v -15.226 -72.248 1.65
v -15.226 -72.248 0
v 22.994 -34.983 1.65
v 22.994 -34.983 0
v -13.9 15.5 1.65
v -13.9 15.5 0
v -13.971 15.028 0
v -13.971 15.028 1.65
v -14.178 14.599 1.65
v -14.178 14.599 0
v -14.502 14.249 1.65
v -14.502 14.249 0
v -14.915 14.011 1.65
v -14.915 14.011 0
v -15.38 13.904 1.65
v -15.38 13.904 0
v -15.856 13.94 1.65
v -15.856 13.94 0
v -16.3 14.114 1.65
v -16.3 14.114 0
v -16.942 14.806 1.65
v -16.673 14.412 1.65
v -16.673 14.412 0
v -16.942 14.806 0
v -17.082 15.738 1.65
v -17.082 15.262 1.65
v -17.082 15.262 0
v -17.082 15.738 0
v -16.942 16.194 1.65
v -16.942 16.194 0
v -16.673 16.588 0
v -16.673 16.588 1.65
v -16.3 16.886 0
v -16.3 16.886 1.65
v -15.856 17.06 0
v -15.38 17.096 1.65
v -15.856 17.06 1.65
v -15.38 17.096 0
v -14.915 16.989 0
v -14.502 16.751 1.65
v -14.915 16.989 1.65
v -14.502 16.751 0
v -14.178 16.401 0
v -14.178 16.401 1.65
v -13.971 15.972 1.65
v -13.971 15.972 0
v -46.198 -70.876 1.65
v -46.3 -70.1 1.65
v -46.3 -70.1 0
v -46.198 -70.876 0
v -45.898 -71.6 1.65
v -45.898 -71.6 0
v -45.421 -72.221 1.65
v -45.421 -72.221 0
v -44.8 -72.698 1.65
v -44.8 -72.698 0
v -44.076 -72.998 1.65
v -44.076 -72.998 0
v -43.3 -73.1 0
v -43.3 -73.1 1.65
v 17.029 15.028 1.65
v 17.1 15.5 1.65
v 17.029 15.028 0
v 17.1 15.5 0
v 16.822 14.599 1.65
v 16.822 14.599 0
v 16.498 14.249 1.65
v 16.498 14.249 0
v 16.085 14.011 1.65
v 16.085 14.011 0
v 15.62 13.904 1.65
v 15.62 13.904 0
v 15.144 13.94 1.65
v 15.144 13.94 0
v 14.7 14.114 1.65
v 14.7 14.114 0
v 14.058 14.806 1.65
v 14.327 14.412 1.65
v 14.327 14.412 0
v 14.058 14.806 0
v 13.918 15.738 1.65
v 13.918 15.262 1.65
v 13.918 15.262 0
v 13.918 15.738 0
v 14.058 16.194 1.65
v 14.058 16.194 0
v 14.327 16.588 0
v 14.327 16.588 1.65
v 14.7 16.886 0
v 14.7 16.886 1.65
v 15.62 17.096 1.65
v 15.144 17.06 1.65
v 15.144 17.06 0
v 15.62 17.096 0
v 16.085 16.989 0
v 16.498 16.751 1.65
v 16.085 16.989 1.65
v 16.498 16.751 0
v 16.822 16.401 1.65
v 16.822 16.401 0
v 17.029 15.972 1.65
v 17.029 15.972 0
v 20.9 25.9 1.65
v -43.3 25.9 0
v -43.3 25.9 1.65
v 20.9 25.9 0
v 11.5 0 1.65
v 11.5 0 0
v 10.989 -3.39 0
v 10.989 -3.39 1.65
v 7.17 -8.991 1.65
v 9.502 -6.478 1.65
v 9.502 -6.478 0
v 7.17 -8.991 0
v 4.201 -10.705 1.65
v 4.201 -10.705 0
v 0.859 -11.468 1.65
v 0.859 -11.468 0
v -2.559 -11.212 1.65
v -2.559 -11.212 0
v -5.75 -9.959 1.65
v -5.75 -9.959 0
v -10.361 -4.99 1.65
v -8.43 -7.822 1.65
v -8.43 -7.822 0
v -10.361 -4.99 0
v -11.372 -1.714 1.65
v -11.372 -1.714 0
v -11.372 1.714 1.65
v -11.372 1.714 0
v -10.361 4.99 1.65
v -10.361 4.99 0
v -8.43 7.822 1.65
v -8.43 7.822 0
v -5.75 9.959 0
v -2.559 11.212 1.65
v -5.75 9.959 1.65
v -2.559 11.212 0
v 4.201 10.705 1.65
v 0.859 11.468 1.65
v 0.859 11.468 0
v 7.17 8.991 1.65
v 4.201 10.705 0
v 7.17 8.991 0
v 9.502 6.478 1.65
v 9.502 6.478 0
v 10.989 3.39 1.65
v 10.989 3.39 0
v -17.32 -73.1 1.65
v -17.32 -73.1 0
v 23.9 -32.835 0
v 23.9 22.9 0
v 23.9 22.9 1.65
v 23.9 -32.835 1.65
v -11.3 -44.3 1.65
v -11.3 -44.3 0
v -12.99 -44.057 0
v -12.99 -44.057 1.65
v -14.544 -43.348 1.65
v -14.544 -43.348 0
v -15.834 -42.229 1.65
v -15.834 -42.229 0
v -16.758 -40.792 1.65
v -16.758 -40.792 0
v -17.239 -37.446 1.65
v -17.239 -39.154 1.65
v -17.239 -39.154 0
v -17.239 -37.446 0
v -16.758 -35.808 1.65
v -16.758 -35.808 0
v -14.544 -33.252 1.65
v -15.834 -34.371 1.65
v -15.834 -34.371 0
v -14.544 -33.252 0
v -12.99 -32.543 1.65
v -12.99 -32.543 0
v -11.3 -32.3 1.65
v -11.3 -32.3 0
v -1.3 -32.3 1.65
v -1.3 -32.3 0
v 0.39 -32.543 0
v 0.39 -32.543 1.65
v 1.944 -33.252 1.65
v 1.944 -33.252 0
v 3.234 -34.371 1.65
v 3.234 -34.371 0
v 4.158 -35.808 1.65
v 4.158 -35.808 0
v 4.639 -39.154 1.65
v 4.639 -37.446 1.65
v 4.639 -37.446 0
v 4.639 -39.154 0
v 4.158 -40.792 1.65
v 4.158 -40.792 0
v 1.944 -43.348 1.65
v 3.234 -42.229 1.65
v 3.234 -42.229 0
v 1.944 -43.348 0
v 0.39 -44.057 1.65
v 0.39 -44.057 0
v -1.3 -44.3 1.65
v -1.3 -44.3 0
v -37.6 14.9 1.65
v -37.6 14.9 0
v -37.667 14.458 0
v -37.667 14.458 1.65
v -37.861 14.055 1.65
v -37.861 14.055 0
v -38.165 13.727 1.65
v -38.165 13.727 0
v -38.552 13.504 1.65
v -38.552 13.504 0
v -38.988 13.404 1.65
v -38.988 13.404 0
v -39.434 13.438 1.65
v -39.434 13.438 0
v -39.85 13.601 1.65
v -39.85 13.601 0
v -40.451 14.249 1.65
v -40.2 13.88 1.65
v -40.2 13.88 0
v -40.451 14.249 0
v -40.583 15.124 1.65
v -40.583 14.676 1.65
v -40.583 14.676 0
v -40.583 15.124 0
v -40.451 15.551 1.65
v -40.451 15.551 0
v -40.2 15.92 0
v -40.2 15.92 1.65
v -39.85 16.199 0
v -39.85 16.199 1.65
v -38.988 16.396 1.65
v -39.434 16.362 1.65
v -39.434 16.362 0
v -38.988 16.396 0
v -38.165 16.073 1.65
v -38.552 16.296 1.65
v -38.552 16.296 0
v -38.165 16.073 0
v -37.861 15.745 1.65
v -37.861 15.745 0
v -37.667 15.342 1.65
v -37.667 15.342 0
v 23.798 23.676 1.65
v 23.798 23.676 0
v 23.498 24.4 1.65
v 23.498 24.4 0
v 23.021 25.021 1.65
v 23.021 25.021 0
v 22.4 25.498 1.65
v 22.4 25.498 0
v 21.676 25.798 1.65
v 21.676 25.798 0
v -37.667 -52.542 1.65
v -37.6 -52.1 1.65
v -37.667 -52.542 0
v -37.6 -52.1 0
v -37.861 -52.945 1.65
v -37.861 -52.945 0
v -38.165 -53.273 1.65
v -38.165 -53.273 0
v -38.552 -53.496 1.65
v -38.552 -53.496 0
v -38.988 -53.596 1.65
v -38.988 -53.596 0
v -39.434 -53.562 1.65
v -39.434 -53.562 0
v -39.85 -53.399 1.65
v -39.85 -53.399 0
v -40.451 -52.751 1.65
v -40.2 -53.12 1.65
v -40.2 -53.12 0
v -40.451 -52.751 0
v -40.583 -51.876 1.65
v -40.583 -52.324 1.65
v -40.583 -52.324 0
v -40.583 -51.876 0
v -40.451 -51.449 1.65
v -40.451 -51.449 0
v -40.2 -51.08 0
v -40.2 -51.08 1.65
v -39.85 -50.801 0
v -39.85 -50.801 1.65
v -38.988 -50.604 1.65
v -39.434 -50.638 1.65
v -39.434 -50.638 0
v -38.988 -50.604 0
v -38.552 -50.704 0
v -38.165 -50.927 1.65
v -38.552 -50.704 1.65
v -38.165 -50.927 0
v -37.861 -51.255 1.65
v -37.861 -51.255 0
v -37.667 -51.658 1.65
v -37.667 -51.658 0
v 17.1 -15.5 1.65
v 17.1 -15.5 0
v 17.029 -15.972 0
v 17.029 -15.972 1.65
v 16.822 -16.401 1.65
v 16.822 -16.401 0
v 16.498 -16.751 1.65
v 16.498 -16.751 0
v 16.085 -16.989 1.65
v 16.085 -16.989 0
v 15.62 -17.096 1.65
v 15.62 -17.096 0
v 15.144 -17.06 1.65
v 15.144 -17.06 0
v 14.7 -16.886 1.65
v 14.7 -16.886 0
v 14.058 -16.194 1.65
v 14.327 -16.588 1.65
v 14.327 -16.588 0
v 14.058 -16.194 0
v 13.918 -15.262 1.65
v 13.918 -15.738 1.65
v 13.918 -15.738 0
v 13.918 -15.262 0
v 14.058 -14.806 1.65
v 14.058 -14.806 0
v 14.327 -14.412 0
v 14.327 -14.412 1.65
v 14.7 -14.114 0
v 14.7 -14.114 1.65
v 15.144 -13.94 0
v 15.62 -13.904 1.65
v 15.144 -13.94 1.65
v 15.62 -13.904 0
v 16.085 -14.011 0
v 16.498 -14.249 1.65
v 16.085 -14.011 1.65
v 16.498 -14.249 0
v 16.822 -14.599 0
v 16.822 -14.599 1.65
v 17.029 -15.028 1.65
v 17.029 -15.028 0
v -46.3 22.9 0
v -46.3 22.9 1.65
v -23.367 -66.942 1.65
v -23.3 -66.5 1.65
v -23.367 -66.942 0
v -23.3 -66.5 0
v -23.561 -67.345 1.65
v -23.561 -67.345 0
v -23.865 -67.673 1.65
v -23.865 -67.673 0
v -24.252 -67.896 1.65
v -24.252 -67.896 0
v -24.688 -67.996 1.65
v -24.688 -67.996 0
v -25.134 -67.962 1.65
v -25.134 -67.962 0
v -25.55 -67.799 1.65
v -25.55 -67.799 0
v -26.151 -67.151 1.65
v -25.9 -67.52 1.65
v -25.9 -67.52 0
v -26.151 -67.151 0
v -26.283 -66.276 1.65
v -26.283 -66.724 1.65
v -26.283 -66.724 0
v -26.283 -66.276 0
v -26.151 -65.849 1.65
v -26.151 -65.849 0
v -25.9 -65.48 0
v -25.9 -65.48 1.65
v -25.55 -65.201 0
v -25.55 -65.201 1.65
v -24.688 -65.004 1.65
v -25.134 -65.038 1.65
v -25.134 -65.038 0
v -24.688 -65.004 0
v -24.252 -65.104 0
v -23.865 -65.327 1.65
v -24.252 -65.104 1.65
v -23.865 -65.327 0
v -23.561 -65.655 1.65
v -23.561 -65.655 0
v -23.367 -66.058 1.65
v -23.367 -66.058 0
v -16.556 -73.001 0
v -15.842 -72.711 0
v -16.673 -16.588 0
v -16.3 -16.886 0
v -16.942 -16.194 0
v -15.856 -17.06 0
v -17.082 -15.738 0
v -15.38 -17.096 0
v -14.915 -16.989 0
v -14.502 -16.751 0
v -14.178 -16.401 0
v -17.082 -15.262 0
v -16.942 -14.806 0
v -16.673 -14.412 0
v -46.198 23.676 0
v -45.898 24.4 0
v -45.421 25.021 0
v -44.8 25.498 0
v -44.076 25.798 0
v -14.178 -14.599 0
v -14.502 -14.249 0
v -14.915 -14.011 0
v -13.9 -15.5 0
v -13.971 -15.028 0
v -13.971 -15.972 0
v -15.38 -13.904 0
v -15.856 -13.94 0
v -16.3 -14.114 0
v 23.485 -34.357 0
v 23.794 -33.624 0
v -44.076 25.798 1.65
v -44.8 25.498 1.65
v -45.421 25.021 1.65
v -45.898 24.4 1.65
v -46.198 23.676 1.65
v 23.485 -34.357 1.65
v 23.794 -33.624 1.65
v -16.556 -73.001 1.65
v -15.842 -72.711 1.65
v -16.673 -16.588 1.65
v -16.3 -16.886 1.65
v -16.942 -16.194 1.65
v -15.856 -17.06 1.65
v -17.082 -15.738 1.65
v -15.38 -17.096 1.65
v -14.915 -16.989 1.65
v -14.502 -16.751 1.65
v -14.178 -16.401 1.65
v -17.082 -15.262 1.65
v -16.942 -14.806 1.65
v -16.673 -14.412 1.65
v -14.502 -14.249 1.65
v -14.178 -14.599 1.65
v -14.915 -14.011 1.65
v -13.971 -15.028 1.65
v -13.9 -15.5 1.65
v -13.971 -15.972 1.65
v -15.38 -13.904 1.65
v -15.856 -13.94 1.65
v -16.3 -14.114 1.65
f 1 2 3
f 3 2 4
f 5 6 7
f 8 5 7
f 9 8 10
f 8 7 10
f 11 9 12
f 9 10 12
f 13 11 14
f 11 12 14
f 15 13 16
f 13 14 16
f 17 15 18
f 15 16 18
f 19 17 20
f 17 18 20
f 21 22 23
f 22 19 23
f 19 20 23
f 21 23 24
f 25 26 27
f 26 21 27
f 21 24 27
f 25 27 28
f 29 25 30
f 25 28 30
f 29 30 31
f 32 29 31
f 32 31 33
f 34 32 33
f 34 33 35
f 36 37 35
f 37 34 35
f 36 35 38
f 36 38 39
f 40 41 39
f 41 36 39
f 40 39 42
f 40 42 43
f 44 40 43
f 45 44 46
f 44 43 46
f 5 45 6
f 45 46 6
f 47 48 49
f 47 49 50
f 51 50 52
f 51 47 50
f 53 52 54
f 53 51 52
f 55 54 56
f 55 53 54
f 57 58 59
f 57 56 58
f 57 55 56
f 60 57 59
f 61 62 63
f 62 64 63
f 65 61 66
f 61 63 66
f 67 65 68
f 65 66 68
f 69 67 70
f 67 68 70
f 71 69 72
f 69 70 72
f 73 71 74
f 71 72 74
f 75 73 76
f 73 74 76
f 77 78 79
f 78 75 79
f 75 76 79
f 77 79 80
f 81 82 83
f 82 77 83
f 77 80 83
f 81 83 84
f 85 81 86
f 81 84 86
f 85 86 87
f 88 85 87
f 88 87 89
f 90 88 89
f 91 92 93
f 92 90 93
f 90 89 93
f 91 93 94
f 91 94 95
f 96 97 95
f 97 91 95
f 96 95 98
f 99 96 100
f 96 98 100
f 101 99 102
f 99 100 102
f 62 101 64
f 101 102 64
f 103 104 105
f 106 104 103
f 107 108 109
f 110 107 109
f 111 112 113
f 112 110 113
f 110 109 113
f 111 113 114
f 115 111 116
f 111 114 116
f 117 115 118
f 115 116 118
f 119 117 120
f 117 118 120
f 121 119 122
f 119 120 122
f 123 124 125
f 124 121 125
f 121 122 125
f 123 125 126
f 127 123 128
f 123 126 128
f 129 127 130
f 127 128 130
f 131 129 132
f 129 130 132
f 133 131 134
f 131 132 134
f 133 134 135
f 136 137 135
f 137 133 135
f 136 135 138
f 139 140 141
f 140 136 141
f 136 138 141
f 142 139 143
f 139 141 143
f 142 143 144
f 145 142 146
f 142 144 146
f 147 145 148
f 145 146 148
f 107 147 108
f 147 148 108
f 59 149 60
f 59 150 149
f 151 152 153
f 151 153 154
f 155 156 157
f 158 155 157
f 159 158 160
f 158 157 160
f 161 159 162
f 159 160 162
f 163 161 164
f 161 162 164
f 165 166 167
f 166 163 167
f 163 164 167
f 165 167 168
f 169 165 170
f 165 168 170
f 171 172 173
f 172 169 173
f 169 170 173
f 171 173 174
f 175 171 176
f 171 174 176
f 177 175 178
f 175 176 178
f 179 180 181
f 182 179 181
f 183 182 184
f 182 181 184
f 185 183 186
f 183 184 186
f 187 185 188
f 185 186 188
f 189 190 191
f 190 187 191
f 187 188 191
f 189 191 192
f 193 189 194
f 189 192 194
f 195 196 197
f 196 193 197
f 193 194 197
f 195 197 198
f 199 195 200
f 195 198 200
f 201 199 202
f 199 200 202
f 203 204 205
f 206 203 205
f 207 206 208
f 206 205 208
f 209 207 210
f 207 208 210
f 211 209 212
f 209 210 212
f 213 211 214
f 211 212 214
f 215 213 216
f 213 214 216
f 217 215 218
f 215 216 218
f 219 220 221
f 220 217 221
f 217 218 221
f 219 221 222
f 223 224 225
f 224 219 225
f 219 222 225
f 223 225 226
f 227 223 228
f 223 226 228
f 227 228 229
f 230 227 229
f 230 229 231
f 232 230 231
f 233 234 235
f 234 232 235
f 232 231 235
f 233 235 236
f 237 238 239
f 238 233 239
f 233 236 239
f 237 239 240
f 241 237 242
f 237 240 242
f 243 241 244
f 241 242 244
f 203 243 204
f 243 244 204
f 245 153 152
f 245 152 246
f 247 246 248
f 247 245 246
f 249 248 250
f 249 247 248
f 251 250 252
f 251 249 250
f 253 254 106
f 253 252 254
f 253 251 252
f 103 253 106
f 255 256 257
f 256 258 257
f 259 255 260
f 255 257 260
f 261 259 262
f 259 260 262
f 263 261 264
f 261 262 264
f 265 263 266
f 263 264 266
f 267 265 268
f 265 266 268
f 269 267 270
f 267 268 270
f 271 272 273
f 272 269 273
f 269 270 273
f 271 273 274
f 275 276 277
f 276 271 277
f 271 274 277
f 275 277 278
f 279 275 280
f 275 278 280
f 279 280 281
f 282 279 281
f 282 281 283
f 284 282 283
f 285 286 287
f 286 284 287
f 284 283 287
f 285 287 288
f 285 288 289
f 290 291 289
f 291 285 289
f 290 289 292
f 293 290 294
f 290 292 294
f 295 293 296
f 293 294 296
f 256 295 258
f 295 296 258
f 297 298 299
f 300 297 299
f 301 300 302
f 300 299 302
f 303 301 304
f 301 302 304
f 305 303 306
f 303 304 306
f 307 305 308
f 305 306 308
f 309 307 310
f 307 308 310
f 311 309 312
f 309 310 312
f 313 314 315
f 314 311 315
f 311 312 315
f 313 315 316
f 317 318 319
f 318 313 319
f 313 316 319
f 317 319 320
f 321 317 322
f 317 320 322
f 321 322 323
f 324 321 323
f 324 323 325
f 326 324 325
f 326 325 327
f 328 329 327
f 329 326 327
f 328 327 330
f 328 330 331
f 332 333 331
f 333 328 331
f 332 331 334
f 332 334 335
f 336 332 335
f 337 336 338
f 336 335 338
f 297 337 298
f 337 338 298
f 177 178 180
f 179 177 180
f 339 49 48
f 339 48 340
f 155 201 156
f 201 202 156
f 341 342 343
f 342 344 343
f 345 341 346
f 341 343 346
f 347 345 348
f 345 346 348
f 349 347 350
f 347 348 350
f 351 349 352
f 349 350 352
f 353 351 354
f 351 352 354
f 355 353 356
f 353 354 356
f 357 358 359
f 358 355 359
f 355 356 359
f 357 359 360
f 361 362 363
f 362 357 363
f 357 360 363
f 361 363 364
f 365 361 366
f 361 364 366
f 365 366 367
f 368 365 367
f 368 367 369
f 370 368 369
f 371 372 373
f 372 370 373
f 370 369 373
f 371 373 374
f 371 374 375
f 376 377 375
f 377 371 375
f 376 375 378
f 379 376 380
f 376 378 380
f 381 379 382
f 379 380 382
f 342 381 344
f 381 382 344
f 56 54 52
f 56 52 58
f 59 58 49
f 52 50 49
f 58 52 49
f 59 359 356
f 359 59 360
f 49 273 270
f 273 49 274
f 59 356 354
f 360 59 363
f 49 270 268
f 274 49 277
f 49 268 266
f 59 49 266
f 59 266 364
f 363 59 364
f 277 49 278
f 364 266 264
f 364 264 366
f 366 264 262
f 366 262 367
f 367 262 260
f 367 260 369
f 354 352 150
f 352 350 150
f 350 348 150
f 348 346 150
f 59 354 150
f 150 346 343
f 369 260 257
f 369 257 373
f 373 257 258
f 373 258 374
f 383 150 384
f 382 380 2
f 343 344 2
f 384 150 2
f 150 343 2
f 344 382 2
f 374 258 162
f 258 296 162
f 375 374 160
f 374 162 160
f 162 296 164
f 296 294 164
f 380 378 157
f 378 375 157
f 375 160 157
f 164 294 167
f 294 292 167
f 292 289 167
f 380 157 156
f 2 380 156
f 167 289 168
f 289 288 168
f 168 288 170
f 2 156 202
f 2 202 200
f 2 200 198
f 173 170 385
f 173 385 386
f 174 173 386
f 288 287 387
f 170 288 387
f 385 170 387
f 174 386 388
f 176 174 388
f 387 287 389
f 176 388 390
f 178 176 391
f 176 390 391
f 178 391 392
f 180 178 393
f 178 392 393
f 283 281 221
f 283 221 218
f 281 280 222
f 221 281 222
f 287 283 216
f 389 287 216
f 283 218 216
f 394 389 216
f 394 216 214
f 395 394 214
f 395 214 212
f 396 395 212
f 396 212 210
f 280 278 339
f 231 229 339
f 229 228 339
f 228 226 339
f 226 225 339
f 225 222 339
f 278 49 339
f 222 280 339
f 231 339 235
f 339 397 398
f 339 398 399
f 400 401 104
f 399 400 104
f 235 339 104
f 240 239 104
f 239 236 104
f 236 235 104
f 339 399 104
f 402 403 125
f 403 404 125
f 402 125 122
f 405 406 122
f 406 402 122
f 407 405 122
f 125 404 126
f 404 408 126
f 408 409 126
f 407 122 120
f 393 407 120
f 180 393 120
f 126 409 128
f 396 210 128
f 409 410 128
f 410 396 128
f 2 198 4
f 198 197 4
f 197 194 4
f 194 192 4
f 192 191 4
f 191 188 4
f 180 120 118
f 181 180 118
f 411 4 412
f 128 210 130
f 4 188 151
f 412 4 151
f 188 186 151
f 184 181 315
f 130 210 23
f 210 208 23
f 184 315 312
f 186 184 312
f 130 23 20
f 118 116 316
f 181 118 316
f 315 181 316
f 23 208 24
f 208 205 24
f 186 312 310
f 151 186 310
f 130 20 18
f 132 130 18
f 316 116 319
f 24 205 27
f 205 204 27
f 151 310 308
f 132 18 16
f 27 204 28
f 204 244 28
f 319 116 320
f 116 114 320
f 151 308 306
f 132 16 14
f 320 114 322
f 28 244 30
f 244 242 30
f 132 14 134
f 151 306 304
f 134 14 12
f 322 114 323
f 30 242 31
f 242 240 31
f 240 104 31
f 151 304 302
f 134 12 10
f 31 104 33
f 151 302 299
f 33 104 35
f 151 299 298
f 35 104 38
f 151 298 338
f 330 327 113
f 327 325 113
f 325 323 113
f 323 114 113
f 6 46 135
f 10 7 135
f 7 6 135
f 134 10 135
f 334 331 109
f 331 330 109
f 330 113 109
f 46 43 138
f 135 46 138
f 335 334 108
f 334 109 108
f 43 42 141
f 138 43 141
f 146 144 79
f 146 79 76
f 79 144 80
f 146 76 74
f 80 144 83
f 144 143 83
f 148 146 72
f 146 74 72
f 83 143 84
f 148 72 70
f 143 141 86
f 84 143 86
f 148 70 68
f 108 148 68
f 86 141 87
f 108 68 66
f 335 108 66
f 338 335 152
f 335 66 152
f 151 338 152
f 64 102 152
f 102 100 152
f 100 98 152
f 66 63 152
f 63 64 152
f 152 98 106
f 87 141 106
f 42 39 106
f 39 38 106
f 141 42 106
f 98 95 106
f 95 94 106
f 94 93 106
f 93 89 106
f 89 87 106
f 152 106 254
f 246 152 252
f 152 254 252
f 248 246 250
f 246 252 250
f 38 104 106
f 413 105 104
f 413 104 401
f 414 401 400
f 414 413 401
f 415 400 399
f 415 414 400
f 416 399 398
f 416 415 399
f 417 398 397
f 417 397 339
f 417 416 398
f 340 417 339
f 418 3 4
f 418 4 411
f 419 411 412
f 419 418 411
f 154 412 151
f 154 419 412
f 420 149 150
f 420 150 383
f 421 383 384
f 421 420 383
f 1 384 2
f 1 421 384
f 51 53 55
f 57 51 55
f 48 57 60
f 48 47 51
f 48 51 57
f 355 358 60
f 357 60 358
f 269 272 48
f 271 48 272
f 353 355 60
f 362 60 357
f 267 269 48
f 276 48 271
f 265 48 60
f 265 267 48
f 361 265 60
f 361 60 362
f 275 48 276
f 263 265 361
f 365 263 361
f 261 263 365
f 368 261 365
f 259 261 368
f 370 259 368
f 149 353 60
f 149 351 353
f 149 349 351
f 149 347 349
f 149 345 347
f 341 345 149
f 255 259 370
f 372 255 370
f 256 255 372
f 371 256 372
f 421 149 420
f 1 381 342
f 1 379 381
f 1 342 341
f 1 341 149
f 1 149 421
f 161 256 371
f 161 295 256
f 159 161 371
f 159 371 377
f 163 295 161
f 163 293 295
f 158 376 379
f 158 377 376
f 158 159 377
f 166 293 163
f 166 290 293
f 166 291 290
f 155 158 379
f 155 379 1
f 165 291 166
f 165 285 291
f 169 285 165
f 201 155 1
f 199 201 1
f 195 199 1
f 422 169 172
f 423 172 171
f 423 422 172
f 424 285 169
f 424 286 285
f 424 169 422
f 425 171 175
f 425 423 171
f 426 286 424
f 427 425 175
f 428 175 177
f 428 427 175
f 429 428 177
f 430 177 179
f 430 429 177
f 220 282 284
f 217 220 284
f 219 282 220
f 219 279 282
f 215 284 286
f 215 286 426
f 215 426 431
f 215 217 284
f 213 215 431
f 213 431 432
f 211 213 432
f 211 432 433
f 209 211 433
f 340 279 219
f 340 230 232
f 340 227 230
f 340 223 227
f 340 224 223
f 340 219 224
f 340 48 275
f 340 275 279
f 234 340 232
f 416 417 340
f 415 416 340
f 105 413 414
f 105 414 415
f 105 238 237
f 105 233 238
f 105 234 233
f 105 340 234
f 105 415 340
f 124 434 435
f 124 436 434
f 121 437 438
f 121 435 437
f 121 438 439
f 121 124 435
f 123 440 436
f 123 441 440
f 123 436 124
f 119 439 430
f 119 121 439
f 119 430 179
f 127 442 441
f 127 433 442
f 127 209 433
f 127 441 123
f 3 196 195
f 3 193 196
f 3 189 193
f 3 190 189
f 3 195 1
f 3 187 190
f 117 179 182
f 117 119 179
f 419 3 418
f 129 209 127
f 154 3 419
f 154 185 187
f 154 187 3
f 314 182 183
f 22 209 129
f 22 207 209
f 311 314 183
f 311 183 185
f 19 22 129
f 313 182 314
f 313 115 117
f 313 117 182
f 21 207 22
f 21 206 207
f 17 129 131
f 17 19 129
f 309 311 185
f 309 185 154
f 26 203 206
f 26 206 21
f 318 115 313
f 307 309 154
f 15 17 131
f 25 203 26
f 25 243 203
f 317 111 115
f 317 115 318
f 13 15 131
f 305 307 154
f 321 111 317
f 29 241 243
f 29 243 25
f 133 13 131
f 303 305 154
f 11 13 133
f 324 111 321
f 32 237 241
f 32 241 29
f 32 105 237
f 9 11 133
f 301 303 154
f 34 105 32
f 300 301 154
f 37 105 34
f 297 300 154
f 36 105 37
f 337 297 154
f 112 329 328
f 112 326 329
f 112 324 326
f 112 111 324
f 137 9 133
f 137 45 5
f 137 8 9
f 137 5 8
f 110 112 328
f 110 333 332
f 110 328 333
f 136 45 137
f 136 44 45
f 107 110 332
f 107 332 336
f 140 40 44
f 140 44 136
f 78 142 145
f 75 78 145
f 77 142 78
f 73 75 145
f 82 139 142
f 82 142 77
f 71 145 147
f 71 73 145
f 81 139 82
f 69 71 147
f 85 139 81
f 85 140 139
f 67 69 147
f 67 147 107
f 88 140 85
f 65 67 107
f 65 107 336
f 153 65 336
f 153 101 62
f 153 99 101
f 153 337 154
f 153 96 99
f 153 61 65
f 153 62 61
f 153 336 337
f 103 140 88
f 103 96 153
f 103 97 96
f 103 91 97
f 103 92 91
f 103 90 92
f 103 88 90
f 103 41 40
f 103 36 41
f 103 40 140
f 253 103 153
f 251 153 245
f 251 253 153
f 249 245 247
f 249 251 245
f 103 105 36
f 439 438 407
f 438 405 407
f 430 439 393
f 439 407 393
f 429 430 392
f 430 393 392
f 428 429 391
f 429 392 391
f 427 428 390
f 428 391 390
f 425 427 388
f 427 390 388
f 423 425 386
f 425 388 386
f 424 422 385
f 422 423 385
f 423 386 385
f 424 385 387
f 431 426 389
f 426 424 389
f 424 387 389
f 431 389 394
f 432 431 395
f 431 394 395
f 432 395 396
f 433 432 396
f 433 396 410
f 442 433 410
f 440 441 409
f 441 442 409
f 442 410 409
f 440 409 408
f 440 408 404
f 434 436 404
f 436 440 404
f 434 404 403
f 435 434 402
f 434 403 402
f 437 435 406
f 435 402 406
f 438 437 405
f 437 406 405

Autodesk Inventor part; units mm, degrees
ref_plane "YZ Plane" through (0, 0, 0) normal (1, 0, 0) x (0, 1, 0)
ref_plane "XZ Plane" through (0, 0, 0) normal (0, 1, 0) x (-1, 0, 0)
ref_plane "XY Plane" through (0, 0, 0) normal (0, 0, 1) x (1, 0, 0)
sketch "Эскиз1" plane through (0, 0, 0) normal (0, 0, 1) x (1, 0, 0)
  line L0 (15.5, 15.5) -> (-15.5, 15.5) construction
  line L1 (-15.5, 15.5) -> (-15.5, -15.5) construction
  line L2 (-15.5, -15.5) -> (15.5, -15.5) construction
  line L3 (15.5, -15.5) -> (15.5, 15.5) construction
  line L4 (15.5, 15.5) -> (-15.5, -15.5) construction
  line L5 (-15.5, 15.5) -> (15.5, -15.5) construction
  circle A0 centre (-15.5, 15.5) radius 1.6
  circle A1 centre (15.5, 15.5) radius 1.6
  circle A2 centre (15.5, -15.5) radius 1.6
  circle A3 centre (-15.5, -15.5) radius 1.6
  circle A4 centre (0, 0) radius 11.5
  line L6 (-46.3, 25.9) -> (23.9, 25.9)
  line L7 (23.9, 25.9) -> (23.9, -34.1)
  line L8 (-16.1, -73.1) -> (-46.3, -73.1)
  line L9 (-46.3, -73.1) -> (-46.3, 25.9)
  line L10 (-16.1, -73.1) -> (23.9, -34.1)
  line L11 (-11.3, -38.3) -> (-1.3, -38.3) construction
  line L12 (-11.3, -32.3) -> (-1.3, -32.3)
  line L13 (-1.3, -44.3) -> (-11.3, -44.3)
  arc A5 (-11.3, -32.3) -> (-11.3, -44.3) centre (-11.3, -38.3) ccw
  arc A6 (-1.3, -44.3) -> (-1.3, -32.3) centre (-1.3, -38.3) ccw
  circle A7 centre (-39.1, 14.9) radius 1.5
  circle A8 centre (-39.1, -52.1) radius 1.5
  circle A9 centre (-24.8, -66.5) radius 1.5
  point P0 (-6.3, -38.3)
  dimension "d0" = 31
  dimension "d1" = 31
  dimension "d2" = 3.2
  dimension "d3" = 3.2
  dimension "d4" = 3.2
  dimension "d5" = 3.2
  dimension "d6" = 23
  dimension "d7" = 6.8
  dimension "d8" = 8.4
  dimension "d9" = 8.8
  dimension "d10" = 70.2
  dimension "d11" = 60
  dimension "d12" = 99
  dimension "d13" = 40
  dimension "d14" = 22
  dimension "d15" = 12
  dimension "d16" = 20.8
  dimension "d17" = 29
  dimension "d18" = 3
  dimension "d19" = 3
  dimension "d20" = 7.2
  dimension "d21" = 7.2
  dimension "d22" = 67
  dimension "d23" = 21
  dimension "d24" = 58.2
  dimension "d25" = 3
  dimension "d26" = 21.5
  dimension "d27" = 6.6
extrude "Выдавливание1" add sketch "Эскиз1" along normal blind 1.65
fillet "Сопряжение1" radius 3 5 edges at (23.9, 25.9, 0.825) (-46.3, 25.9, 0.825) (23.9, -34.1, 0.825) (-16.1, -73.1, 0.825) (-46.3, -73.1, 0.825)
properties part number "пластина  экструдера"
